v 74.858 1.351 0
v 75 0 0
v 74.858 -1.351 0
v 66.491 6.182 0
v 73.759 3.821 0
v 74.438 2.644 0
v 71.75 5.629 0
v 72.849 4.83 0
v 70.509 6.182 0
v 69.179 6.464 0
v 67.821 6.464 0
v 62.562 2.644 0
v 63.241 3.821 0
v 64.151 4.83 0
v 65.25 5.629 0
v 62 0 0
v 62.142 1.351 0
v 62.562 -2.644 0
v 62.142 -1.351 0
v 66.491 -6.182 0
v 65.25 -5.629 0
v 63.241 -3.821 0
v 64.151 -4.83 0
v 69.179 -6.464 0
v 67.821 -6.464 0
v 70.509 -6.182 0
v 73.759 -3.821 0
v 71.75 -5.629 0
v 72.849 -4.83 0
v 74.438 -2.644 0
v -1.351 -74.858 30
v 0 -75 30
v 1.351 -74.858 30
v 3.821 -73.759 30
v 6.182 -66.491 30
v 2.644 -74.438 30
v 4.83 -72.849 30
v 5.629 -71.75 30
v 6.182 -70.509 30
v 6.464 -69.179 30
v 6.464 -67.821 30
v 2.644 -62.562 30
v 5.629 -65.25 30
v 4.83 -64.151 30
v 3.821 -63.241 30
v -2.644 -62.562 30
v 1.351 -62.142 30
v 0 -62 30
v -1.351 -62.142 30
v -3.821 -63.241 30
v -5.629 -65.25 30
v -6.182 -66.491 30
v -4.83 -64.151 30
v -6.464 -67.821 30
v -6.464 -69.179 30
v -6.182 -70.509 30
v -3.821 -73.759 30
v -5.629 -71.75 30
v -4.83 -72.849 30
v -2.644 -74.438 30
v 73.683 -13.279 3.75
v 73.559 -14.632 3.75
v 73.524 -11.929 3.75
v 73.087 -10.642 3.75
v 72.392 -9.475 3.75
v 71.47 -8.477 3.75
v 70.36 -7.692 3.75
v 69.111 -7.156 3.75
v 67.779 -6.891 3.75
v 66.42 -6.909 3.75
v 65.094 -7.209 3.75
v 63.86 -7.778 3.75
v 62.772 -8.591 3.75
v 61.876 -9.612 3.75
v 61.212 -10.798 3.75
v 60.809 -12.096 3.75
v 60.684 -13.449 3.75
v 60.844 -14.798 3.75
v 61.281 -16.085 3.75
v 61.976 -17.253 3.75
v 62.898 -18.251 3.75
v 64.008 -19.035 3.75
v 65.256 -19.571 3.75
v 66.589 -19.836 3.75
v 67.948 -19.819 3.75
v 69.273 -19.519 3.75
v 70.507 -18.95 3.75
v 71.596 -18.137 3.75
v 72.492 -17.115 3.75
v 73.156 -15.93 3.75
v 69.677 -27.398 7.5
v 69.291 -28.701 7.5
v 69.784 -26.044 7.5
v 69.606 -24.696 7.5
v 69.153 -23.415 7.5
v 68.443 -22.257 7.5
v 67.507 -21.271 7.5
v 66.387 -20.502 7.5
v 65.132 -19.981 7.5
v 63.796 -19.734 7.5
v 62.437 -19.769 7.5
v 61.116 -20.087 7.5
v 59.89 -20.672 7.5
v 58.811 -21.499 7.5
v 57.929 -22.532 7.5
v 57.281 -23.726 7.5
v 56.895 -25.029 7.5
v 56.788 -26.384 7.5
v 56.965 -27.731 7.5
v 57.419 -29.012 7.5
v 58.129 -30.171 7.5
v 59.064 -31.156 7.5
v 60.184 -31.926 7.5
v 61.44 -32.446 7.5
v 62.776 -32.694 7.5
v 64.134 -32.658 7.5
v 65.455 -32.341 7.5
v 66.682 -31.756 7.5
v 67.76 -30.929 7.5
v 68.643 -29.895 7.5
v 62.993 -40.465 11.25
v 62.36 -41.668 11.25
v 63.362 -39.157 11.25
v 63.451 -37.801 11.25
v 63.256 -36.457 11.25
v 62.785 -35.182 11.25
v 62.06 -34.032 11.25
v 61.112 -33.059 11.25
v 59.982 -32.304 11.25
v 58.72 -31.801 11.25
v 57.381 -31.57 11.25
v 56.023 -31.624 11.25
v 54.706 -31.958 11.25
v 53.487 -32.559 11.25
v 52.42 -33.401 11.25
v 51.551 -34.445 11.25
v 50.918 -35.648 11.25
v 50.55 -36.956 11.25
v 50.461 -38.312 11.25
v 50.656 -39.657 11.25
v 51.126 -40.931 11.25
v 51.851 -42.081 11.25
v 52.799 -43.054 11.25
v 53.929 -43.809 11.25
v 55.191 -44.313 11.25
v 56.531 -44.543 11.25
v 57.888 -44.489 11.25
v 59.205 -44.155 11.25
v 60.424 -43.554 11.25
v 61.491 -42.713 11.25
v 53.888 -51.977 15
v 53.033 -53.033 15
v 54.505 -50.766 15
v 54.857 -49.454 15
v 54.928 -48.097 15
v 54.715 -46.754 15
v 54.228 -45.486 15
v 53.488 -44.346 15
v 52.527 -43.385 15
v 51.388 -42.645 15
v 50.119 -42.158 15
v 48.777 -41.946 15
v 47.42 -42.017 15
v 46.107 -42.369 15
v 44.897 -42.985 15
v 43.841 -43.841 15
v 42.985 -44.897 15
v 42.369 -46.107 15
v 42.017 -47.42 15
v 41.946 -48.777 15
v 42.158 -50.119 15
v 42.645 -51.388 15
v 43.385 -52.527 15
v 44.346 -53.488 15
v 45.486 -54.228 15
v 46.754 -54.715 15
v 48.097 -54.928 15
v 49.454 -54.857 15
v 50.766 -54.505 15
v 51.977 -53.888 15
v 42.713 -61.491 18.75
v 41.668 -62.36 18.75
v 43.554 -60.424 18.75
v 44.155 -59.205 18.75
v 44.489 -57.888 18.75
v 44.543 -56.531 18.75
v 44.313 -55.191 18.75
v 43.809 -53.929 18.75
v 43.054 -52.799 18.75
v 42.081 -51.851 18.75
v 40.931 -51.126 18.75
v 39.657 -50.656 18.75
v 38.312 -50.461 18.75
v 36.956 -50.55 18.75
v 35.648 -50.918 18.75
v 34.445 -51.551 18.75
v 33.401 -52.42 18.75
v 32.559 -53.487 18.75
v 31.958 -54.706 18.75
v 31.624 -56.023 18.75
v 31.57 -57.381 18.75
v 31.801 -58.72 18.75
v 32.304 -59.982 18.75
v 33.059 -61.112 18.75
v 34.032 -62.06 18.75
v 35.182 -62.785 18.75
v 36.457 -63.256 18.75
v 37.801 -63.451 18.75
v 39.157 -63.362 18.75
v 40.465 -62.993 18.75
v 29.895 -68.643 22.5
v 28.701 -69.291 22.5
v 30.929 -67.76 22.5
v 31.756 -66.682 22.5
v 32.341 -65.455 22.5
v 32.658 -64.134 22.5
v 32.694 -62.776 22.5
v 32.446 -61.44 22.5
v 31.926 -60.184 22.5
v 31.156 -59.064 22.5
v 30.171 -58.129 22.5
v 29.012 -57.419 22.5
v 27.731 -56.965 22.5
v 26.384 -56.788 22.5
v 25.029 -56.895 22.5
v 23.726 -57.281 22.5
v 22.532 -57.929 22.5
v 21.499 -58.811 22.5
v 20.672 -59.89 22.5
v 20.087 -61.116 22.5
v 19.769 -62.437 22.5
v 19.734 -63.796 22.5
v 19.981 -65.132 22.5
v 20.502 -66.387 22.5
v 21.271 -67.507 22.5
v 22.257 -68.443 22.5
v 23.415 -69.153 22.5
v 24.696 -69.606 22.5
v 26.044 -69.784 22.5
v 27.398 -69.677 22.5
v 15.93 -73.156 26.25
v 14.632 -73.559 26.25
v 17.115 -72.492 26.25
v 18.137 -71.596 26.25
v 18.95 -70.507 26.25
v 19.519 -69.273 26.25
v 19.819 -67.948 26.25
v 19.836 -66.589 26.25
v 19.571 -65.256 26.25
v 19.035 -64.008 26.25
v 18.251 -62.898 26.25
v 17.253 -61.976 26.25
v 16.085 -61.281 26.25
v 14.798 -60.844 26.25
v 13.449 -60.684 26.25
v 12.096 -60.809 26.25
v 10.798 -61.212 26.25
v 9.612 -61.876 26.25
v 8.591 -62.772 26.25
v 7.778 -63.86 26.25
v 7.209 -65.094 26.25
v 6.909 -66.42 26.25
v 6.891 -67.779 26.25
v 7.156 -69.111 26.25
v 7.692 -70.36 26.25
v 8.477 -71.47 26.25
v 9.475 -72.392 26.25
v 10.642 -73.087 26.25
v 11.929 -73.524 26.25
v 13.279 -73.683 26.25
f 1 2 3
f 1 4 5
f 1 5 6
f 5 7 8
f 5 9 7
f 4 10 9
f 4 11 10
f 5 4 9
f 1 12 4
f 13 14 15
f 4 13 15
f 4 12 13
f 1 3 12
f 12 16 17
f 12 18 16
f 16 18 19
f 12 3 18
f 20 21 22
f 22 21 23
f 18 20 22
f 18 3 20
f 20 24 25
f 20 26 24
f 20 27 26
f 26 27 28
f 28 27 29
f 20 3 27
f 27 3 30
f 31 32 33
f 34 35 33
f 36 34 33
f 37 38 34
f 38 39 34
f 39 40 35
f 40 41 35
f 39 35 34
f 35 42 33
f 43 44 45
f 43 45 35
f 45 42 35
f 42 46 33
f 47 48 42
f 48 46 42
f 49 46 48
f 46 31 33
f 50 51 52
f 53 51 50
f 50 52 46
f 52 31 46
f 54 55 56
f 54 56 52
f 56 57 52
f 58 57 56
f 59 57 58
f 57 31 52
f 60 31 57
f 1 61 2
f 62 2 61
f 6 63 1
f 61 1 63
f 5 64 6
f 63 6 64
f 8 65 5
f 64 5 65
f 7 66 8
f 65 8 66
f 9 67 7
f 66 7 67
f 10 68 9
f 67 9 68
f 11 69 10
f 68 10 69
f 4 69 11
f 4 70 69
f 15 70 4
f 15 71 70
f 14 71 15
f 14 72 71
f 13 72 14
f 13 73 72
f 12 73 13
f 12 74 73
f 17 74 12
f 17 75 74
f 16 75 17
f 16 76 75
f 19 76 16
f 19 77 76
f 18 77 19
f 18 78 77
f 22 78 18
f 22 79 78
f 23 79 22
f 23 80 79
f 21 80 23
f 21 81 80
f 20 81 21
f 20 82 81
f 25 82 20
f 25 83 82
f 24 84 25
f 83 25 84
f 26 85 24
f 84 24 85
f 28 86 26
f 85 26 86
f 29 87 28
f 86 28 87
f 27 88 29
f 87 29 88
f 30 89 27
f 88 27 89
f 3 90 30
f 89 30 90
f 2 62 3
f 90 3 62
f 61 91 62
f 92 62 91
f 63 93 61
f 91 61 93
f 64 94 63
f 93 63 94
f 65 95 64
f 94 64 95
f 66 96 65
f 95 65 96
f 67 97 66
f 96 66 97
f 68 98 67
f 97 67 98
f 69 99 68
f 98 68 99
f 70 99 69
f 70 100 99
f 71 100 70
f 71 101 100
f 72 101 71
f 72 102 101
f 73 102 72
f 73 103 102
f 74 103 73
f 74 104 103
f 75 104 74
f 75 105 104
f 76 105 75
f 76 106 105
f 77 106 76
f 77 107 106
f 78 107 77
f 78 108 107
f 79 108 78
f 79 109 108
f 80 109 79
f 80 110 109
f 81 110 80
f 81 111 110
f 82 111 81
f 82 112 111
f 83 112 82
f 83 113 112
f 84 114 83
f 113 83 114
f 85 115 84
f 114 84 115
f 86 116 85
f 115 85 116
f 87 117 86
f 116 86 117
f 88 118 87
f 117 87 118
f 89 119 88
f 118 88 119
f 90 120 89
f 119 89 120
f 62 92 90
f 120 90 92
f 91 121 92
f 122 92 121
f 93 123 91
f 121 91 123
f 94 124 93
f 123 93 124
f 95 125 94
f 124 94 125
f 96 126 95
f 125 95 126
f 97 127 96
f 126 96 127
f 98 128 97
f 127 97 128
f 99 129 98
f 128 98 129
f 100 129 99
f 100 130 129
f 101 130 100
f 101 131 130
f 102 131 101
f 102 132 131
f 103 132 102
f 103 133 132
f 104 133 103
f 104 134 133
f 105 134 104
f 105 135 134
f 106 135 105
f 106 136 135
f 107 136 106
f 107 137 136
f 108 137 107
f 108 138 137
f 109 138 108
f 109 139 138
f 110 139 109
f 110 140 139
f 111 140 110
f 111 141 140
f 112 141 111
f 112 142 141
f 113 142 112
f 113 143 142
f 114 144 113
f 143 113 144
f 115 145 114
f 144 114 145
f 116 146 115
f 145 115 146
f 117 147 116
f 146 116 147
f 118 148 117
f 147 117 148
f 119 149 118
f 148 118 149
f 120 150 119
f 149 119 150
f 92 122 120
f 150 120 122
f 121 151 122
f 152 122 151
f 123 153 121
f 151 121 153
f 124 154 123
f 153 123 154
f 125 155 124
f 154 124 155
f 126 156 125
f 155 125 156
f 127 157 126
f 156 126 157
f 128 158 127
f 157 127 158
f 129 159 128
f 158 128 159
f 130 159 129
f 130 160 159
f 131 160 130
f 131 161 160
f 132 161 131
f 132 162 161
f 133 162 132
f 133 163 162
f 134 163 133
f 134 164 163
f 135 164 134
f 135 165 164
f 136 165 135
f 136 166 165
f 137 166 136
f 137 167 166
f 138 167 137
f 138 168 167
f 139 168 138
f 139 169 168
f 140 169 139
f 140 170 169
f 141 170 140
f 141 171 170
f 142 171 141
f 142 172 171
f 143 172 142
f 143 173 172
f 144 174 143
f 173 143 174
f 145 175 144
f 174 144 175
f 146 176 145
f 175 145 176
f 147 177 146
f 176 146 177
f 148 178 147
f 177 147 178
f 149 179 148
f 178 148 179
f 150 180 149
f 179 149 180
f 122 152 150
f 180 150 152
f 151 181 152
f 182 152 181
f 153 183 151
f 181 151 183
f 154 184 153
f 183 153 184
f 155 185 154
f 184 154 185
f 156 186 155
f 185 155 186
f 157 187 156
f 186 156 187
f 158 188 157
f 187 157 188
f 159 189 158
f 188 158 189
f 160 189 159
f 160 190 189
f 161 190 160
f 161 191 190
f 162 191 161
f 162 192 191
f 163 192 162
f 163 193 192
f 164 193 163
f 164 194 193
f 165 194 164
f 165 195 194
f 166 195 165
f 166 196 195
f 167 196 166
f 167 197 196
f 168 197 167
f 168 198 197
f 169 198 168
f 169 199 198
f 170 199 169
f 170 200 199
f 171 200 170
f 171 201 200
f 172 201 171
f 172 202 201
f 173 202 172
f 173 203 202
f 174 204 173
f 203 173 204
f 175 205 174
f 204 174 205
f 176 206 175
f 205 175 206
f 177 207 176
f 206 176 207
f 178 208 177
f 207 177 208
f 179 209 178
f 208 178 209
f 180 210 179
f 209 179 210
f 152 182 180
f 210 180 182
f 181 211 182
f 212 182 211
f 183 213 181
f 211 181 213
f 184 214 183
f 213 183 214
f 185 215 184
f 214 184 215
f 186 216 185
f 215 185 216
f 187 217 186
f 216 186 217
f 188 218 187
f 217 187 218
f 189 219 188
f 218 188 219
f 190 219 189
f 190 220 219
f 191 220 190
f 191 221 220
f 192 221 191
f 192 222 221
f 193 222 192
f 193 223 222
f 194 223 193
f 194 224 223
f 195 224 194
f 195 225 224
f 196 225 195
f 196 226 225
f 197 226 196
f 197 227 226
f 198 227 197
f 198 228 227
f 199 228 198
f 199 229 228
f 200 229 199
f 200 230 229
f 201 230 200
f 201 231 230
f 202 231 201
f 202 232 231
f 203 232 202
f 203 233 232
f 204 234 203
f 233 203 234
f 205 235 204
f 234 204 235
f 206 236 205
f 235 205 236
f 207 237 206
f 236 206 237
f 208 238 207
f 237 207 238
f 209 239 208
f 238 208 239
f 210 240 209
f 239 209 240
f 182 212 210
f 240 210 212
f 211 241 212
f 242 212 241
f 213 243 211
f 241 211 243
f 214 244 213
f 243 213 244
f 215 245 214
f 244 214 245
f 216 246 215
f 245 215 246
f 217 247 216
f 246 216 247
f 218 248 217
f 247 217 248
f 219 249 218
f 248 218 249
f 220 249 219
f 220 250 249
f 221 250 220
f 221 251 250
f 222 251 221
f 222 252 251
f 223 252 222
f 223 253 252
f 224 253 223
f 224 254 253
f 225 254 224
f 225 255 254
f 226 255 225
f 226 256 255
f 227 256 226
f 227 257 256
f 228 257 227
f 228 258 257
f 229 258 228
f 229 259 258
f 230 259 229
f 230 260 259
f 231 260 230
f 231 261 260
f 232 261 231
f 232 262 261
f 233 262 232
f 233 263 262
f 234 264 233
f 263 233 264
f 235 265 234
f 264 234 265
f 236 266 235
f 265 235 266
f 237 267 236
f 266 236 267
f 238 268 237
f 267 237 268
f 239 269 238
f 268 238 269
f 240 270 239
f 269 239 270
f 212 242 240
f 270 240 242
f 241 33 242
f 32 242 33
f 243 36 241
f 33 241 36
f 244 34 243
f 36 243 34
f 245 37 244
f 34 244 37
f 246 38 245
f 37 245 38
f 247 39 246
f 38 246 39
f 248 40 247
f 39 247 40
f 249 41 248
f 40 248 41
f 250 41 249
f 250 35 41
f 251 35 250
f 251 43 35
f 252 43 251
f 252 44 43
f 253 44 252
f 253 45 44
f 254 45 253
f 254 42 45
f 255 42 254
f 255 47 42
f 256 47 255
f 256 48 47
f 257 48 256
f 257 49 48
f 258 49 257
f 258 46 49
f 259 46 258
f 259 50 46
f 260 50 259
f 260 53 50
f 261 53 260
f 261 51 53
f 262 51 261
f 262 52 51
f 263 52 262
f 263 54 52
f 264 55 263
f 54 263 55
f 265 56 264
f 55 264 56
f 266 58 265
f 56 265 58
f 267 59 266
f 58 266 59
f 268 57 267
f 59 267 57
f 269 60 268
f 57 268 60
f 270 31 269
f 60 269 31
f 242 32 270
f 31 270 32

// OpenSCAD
$fs=0.1;

height_top=30;
height_middle=100;
height_bottom=30;

wall_width=3;

diameter_top_outer=98;
diameter_top_inner=diameter_top_outer-wall_width;
diameter_bottom_inner=150;
diameter_bottom_outer=diameter_bottom_inner+wall_width;

top_diamater_scew = 2;

screw_height = 3;
screw_length=10;

collision_space=0.1;

translate([0,0,height_middle+height_bottom]) 
difference(){
    cylinder(h = height_top, d1 = diameter_top_outer, d2 = diameter_top_outer - top_diamater_scew);
    translate([0,0,-collision_space]) 
        cylinder(h = height_top+collision_space*2, d = diameter_top_inner - top_diamater_scew);
} 

translate([0,0,height_bottom]) 
difference(){
    cylinder(h = height_middle, d1 = diameter_bottom_outer, d2 = diameter_top_outer);
    translate([0,0,-collision_space]) 
        cylinder(h = height_middle+collision_space*2, d1 = diameter_bottom_inner, d2 = diameter_top_inner);
} 

module thread(){
    module thread_section(){
        linear_extrude(height = height_bottom, center = false, twist = 90)
        translate([diameter_bottom_outer/2-screw_length/2-wall_width, 0, 0])
            circle(d=screw_length+wall_width);
    }
    thread_section();
}
!
thread();

difference(){
    cylinder(h = height_bottom, d = diameter_bottom_outer);
    translate([0,0,-collision_space]) 
        cylinder(h = height_bottom+collision_space*2, d = diameter_bottom_inner);
} 
